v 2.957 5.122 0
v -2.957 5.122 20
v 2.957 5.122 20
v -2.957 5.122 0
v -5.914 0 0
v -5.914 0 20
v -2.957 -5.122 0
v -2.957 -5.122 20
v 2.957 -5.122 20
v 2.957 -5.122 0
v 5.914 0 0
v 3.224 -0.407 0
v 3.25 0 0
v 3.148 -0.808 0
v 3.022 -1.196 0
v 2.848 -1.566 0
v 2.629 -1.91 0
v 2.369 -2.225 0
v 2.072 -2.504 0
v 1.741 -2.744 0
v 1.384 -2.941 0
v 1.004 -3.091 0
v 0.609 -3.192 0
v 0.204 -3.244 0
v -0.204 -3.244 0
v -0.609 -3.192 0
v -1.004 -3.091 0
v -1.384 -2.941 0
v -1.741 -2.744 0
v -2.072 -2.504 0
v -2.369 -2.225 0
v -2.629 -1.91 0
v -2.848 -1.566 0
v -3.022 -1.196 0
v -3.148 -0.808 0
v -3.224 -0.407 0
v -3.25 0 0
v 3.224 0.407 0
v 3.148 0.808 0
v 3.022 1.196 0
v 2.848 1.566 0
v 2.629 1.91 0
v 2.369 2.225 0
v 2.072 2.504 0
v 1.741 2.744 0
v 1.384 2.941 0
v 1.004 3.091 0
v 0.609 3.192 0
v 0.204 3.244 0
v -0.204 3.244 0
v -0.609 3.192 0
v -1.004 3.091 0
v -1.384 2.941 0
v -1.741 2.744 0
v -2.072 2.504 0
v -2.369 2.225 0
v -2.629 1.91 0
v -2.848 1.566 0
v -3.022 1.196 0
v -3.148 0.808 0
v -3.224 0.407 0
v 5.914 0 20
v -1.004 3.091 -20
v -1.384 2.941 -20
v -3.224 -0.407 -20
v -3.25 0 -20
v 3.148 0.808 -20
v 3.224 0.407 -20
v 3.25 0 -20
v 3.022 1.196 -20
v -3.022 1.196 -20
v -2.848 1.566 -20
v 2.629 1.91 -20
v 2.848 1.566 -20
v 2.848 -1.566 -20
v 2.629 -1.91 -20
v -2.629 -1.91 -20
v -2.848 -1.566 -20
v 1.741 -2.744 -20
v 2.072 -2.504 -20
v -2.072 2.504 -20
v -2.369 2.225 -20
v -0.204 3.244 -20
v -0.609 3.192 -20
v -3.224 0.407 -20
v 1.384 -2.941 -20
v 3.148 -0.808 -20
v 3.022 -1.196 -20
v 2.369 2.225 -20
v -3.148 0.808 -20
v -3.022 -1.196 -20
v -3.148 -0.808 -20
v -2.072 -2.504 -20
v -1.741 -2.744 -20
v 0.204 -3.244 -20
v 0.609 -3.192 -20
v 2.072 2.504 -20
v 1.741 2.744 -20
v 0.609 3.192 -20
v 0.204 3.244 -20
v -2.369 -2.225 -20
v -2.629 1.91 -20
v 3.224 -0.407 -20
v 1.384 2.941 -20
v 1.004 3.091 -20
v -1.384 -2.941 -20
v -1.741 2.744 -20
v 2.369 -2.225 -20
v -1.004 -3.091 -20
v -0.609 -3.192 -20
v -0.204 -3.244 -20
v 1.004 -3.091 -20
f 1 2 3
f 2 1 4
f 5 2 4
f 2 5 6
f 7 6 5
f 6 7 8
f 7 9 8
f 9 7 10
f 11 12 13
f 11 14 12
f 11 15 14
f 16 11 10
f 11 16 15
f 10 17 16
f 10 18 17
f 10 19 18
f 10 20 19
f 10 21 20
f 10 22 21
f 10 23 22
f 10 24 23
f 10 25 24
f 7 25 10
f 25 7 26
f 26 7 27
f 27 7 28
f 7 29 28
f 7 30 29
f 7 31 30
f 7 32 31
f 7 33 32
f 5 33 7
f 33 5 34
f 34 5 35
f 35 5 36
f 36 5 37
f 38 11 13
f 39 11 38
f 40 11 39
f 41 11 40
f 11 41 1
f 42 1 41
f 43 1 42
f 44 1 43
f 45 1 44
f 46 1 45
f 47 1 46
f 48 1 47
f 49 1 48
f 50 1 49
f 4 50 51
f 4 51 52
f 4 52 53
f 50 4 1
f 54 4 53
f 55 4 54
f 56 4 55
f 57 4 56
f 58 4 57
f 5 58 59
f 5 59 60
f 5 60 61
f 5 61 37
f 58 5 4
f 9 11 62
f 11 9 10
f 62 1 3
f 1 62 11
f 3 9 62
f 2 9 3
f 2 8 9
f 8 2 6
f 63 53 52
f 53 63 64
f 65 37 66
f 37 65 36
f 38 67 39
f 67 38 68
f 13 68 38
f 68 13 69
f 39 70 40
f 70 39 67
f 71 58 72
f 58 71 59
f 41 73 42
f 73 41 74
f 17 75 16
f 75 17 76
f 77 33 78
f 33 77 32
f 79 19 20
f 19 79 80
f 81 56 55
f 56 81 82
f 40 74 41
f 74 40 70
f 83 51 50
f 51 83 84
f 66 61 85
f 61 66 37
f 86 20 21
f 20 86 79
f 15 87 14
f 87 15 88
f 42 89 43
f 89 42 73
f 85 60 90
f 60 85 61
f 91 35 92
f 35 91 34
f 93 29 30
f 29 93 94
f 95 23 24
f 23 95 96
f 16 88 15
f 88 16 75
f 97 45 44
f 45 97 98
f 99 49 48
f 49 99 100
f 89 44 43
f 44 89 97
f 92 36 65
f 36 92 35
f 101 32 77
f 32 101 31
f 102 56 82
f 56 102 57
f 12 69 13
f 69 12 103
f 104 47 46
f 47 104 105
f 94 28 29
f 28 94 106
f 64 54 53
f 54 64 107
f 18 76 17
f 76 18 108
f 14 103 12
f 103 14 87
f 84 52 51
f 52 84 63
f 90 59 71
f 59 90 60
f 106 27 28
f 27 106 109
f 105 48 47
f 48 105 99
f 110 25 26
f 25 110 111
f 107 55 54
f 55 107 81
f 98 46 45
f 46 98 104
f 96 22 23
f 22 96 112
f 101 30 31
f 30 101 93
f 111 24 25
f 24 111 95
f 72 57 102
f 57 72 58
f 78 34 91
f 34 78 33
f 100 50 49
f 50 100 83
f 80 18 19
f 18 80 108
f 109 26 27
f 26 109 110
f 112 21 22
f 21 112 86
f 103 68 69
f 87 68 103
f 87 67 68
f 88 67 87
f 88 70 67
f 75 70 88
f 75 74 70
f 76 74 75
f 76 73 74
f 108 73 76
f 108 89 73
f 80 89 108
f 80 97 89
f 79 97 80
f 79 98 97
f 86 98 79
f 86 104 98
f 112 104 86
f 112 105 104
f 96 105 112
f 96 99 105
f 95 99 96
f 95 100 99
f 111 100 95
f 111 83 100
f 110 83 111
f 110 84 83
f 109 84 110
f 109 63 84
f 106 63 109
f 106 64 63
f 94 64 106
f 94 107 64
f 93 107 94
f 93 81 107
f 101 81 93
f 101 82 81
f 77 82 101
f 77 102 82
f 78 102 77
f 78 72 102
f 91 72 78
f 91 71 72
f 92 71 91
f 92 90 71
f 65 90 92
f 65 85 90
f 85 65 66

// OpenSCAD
$fn = 50;


difference() {
	union() {
		linear_extrude(height = 20) {
			polygon(points = [[5.9142500000, 0.0000000000], [2.9571250000, 5.1218907443], [-2.9571250000, 5.1218907443], [-5.9142500000, 0.0000000000], [-2.9571250000, -5.1218907443], [2.9571250000, -5.1218907443]]);
		}
		translate(v = [0, 0, -20]) {
			cylinder(h = 20, r = 3.2500000000);
		}
	}
	union();
}
